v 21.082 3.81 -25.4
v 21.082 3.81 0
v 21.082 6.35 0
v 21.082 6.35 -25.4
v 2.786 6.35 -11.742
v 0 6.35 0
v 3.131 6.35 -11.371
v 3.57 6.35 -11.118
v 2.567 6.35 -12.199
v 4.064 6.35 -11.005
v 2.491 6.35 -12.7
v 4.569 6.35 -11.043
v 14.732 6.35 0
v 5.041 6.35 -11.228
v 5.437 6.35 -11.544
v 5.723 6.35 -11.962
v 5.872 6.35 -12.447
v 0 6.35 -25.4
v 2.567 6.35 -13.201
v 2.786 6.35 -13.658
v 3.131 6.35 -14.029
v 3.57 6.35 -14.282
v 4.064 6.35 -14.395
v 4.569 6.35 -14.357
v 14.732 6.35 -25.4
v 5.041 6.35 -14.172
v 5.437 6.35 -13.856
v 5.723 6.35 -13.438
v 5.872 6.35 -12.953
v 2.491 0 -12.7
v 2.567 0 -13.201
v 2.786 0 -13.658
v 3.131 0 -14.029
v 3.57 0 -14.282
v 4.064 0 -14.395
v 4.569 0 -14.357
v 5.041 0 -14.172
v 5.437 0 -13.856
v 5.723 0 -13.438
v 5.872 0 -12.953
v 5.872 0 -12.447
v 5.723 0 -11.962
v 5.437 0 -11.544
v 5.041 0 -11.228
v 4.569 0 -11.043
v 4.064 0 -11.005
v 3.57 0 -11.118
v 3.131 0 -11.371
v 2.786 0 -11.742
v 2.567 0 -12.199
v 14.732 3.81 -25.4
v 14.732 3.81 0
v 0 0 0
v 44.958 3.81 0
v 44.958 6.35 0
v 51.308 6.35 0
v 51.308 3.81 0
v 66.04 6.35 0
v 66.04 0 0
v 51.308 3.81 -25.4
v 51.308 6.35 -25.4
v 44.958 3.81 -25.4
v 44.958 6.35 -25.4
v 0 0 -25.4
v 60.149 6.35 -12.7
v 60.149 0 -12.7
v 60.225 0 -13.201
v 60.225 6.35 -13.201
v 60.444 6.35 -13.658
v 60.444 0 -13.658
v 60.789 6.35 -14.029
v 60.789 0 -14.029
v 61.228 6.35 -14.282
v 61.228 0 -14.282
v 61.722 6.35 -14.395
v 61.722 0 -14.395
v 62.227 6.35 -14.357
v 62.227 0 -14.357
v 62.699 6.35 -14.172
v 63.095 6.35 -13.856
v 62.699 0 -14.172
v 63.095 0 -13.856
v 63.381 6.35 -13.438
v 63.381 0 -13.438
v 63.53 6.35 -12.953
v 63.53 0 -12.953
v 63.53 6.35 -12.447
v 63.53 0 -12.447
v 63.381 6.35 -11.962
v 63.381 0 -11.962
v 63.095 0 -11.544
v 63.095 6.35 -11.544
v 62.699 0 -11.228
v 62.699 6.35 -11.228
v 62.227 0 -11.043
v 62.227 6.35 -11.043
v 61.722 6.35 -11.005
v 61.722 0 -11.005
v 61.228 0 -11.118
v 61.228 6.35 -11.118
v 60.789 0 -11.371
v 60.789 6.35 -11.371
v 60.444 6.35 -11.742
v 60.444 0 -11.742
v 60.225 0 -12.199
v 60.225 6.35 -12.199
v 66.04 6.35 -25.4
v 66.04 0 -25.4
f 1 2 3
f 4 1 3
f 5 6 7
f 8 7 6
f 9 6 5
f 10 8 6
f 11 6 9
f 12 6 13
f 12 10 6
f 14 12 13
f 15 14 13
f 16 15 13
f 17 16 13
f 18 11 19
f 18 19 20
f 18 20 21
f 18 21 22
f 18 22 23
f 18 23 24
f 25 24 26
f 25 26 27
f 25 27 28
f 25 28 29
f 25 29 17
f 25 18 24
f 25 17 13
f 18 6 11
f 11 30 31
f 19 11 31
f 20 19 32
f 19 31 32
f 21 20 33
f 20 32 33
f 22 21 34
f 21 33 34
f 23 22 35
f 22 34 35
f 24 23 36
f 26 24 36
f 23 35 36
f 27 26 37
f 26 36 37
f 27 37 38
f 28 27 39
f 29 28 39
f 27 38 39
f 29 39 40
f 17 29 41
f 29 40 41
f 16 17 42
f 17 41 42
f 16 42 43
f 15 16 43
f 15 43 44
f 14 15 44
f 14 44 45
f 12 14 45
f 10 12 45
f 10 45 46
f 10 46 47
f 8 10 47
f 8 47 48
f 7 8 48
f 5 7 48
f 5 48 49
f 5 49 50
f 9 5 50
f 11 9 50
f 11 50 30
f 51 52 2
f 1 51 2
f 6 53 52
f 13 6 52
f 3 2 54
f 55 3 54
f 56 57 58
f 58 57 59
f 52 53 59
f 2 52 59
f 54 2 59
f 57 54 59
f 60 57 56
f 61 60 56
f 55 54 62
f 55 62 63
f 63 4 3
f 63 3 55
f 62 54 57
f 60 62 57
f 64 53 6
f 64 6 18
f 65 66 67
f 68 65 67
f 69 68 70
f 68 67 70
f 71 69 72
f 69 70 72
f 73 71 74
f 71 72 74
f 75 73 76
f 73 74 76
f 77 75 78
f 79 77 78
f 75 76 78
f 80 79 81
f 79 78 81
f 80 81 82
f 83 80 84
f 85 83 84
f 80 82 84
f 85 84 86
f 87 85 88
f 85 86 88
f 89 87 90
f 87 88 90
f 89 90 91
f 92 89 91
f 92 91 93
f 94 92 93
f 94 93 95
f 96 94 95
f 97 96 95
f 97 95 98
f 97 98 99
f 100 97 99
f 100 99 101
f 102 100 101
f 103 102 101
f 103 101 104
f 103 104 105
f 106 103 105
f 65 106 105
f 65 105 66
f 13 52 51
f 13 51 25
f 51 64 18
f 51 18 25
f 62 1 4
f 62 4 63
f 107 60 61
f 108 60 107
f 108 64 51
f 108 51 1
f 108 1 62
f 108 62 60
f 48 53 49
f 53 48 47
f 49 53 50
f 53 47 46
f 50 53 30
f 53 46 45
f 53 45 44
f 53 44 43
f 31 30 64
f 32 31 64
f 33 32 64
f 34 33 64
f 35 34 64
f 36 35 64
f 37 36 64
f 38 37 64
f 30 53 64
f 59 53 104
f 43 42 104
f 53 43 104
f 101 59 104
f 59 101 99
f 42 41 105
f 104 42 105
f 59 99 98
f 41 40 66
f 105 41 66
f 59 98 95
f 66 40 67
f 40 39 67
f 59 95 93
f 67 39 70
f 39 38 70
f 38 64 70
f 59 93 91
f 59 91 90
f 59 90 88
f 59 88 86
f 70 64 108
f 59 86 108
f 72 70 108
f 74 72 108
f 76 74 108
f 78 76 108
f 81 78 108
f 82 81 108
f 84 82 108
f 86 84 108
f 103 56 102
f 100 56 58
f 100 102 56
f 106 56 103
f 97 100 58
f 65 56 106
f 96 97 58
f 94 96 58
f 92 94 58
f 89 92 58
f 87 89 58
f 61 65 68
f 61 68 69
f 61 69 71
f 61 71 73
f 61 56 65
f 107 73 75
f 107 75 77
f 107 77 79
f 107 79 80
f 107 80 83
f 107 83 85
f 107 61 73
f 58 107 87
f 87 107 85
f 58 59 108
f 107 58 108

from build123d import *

# Parameters (mm, degrees)
SKETCH1_W            = 66.04
SKETCH1_H            = 25.4
BOSS_EXTRUDE1_DEPTH  = 6.35
M3_CLEARANCE_HOLE1_D = 3.4
SKETCH5_W            = 6.35
SKETCH5_H            = 2.54
CUT_EXTRUDE1_DEPTH   = 72.040580656


with BuildPart() as part:
    # Sketch1 → Boss-Extrude1 (new body)
    with BuildSketch(Plane(origin=(0, 0, 0), x_dir=(1, 0, 0), z_dir=(0, 1, 0))):
        with Locations((33.02, 12.7)):
            Rectangle(SKETCH1_W, SKETCH1_H)
    extrude(amount=BOSS_EXTRUDE1_DEPTH)

    # M3 Clearance Hole1 (through all)
    with Locations(Plane(origin=(0, 6.35, 0), x_dir=(1, 0, 0), z_dir=(0, 1, 0))):
        with Locations((4.191, 12.7), (61.849, 12.7)):
            Hole(M3_CLEARANCE_HOLE1_D / 2)

    # Sketch5 → Cut-Extrude1 (cut, through all)
    with BuildSketch(Plane.XY):
        with Locations((48.133, 5.08)):
            Rectangle(SKETCH5_W, SKETCH5_H)
        with Locations((17.907, 5.08)):
            Rectangle(SKETCH5_W, SKETCH5_H)
    extrude(amount=-CUT_EXTRUDE1_DEPTH, mode=Mode.SUBTRACT)


solid = part.part
